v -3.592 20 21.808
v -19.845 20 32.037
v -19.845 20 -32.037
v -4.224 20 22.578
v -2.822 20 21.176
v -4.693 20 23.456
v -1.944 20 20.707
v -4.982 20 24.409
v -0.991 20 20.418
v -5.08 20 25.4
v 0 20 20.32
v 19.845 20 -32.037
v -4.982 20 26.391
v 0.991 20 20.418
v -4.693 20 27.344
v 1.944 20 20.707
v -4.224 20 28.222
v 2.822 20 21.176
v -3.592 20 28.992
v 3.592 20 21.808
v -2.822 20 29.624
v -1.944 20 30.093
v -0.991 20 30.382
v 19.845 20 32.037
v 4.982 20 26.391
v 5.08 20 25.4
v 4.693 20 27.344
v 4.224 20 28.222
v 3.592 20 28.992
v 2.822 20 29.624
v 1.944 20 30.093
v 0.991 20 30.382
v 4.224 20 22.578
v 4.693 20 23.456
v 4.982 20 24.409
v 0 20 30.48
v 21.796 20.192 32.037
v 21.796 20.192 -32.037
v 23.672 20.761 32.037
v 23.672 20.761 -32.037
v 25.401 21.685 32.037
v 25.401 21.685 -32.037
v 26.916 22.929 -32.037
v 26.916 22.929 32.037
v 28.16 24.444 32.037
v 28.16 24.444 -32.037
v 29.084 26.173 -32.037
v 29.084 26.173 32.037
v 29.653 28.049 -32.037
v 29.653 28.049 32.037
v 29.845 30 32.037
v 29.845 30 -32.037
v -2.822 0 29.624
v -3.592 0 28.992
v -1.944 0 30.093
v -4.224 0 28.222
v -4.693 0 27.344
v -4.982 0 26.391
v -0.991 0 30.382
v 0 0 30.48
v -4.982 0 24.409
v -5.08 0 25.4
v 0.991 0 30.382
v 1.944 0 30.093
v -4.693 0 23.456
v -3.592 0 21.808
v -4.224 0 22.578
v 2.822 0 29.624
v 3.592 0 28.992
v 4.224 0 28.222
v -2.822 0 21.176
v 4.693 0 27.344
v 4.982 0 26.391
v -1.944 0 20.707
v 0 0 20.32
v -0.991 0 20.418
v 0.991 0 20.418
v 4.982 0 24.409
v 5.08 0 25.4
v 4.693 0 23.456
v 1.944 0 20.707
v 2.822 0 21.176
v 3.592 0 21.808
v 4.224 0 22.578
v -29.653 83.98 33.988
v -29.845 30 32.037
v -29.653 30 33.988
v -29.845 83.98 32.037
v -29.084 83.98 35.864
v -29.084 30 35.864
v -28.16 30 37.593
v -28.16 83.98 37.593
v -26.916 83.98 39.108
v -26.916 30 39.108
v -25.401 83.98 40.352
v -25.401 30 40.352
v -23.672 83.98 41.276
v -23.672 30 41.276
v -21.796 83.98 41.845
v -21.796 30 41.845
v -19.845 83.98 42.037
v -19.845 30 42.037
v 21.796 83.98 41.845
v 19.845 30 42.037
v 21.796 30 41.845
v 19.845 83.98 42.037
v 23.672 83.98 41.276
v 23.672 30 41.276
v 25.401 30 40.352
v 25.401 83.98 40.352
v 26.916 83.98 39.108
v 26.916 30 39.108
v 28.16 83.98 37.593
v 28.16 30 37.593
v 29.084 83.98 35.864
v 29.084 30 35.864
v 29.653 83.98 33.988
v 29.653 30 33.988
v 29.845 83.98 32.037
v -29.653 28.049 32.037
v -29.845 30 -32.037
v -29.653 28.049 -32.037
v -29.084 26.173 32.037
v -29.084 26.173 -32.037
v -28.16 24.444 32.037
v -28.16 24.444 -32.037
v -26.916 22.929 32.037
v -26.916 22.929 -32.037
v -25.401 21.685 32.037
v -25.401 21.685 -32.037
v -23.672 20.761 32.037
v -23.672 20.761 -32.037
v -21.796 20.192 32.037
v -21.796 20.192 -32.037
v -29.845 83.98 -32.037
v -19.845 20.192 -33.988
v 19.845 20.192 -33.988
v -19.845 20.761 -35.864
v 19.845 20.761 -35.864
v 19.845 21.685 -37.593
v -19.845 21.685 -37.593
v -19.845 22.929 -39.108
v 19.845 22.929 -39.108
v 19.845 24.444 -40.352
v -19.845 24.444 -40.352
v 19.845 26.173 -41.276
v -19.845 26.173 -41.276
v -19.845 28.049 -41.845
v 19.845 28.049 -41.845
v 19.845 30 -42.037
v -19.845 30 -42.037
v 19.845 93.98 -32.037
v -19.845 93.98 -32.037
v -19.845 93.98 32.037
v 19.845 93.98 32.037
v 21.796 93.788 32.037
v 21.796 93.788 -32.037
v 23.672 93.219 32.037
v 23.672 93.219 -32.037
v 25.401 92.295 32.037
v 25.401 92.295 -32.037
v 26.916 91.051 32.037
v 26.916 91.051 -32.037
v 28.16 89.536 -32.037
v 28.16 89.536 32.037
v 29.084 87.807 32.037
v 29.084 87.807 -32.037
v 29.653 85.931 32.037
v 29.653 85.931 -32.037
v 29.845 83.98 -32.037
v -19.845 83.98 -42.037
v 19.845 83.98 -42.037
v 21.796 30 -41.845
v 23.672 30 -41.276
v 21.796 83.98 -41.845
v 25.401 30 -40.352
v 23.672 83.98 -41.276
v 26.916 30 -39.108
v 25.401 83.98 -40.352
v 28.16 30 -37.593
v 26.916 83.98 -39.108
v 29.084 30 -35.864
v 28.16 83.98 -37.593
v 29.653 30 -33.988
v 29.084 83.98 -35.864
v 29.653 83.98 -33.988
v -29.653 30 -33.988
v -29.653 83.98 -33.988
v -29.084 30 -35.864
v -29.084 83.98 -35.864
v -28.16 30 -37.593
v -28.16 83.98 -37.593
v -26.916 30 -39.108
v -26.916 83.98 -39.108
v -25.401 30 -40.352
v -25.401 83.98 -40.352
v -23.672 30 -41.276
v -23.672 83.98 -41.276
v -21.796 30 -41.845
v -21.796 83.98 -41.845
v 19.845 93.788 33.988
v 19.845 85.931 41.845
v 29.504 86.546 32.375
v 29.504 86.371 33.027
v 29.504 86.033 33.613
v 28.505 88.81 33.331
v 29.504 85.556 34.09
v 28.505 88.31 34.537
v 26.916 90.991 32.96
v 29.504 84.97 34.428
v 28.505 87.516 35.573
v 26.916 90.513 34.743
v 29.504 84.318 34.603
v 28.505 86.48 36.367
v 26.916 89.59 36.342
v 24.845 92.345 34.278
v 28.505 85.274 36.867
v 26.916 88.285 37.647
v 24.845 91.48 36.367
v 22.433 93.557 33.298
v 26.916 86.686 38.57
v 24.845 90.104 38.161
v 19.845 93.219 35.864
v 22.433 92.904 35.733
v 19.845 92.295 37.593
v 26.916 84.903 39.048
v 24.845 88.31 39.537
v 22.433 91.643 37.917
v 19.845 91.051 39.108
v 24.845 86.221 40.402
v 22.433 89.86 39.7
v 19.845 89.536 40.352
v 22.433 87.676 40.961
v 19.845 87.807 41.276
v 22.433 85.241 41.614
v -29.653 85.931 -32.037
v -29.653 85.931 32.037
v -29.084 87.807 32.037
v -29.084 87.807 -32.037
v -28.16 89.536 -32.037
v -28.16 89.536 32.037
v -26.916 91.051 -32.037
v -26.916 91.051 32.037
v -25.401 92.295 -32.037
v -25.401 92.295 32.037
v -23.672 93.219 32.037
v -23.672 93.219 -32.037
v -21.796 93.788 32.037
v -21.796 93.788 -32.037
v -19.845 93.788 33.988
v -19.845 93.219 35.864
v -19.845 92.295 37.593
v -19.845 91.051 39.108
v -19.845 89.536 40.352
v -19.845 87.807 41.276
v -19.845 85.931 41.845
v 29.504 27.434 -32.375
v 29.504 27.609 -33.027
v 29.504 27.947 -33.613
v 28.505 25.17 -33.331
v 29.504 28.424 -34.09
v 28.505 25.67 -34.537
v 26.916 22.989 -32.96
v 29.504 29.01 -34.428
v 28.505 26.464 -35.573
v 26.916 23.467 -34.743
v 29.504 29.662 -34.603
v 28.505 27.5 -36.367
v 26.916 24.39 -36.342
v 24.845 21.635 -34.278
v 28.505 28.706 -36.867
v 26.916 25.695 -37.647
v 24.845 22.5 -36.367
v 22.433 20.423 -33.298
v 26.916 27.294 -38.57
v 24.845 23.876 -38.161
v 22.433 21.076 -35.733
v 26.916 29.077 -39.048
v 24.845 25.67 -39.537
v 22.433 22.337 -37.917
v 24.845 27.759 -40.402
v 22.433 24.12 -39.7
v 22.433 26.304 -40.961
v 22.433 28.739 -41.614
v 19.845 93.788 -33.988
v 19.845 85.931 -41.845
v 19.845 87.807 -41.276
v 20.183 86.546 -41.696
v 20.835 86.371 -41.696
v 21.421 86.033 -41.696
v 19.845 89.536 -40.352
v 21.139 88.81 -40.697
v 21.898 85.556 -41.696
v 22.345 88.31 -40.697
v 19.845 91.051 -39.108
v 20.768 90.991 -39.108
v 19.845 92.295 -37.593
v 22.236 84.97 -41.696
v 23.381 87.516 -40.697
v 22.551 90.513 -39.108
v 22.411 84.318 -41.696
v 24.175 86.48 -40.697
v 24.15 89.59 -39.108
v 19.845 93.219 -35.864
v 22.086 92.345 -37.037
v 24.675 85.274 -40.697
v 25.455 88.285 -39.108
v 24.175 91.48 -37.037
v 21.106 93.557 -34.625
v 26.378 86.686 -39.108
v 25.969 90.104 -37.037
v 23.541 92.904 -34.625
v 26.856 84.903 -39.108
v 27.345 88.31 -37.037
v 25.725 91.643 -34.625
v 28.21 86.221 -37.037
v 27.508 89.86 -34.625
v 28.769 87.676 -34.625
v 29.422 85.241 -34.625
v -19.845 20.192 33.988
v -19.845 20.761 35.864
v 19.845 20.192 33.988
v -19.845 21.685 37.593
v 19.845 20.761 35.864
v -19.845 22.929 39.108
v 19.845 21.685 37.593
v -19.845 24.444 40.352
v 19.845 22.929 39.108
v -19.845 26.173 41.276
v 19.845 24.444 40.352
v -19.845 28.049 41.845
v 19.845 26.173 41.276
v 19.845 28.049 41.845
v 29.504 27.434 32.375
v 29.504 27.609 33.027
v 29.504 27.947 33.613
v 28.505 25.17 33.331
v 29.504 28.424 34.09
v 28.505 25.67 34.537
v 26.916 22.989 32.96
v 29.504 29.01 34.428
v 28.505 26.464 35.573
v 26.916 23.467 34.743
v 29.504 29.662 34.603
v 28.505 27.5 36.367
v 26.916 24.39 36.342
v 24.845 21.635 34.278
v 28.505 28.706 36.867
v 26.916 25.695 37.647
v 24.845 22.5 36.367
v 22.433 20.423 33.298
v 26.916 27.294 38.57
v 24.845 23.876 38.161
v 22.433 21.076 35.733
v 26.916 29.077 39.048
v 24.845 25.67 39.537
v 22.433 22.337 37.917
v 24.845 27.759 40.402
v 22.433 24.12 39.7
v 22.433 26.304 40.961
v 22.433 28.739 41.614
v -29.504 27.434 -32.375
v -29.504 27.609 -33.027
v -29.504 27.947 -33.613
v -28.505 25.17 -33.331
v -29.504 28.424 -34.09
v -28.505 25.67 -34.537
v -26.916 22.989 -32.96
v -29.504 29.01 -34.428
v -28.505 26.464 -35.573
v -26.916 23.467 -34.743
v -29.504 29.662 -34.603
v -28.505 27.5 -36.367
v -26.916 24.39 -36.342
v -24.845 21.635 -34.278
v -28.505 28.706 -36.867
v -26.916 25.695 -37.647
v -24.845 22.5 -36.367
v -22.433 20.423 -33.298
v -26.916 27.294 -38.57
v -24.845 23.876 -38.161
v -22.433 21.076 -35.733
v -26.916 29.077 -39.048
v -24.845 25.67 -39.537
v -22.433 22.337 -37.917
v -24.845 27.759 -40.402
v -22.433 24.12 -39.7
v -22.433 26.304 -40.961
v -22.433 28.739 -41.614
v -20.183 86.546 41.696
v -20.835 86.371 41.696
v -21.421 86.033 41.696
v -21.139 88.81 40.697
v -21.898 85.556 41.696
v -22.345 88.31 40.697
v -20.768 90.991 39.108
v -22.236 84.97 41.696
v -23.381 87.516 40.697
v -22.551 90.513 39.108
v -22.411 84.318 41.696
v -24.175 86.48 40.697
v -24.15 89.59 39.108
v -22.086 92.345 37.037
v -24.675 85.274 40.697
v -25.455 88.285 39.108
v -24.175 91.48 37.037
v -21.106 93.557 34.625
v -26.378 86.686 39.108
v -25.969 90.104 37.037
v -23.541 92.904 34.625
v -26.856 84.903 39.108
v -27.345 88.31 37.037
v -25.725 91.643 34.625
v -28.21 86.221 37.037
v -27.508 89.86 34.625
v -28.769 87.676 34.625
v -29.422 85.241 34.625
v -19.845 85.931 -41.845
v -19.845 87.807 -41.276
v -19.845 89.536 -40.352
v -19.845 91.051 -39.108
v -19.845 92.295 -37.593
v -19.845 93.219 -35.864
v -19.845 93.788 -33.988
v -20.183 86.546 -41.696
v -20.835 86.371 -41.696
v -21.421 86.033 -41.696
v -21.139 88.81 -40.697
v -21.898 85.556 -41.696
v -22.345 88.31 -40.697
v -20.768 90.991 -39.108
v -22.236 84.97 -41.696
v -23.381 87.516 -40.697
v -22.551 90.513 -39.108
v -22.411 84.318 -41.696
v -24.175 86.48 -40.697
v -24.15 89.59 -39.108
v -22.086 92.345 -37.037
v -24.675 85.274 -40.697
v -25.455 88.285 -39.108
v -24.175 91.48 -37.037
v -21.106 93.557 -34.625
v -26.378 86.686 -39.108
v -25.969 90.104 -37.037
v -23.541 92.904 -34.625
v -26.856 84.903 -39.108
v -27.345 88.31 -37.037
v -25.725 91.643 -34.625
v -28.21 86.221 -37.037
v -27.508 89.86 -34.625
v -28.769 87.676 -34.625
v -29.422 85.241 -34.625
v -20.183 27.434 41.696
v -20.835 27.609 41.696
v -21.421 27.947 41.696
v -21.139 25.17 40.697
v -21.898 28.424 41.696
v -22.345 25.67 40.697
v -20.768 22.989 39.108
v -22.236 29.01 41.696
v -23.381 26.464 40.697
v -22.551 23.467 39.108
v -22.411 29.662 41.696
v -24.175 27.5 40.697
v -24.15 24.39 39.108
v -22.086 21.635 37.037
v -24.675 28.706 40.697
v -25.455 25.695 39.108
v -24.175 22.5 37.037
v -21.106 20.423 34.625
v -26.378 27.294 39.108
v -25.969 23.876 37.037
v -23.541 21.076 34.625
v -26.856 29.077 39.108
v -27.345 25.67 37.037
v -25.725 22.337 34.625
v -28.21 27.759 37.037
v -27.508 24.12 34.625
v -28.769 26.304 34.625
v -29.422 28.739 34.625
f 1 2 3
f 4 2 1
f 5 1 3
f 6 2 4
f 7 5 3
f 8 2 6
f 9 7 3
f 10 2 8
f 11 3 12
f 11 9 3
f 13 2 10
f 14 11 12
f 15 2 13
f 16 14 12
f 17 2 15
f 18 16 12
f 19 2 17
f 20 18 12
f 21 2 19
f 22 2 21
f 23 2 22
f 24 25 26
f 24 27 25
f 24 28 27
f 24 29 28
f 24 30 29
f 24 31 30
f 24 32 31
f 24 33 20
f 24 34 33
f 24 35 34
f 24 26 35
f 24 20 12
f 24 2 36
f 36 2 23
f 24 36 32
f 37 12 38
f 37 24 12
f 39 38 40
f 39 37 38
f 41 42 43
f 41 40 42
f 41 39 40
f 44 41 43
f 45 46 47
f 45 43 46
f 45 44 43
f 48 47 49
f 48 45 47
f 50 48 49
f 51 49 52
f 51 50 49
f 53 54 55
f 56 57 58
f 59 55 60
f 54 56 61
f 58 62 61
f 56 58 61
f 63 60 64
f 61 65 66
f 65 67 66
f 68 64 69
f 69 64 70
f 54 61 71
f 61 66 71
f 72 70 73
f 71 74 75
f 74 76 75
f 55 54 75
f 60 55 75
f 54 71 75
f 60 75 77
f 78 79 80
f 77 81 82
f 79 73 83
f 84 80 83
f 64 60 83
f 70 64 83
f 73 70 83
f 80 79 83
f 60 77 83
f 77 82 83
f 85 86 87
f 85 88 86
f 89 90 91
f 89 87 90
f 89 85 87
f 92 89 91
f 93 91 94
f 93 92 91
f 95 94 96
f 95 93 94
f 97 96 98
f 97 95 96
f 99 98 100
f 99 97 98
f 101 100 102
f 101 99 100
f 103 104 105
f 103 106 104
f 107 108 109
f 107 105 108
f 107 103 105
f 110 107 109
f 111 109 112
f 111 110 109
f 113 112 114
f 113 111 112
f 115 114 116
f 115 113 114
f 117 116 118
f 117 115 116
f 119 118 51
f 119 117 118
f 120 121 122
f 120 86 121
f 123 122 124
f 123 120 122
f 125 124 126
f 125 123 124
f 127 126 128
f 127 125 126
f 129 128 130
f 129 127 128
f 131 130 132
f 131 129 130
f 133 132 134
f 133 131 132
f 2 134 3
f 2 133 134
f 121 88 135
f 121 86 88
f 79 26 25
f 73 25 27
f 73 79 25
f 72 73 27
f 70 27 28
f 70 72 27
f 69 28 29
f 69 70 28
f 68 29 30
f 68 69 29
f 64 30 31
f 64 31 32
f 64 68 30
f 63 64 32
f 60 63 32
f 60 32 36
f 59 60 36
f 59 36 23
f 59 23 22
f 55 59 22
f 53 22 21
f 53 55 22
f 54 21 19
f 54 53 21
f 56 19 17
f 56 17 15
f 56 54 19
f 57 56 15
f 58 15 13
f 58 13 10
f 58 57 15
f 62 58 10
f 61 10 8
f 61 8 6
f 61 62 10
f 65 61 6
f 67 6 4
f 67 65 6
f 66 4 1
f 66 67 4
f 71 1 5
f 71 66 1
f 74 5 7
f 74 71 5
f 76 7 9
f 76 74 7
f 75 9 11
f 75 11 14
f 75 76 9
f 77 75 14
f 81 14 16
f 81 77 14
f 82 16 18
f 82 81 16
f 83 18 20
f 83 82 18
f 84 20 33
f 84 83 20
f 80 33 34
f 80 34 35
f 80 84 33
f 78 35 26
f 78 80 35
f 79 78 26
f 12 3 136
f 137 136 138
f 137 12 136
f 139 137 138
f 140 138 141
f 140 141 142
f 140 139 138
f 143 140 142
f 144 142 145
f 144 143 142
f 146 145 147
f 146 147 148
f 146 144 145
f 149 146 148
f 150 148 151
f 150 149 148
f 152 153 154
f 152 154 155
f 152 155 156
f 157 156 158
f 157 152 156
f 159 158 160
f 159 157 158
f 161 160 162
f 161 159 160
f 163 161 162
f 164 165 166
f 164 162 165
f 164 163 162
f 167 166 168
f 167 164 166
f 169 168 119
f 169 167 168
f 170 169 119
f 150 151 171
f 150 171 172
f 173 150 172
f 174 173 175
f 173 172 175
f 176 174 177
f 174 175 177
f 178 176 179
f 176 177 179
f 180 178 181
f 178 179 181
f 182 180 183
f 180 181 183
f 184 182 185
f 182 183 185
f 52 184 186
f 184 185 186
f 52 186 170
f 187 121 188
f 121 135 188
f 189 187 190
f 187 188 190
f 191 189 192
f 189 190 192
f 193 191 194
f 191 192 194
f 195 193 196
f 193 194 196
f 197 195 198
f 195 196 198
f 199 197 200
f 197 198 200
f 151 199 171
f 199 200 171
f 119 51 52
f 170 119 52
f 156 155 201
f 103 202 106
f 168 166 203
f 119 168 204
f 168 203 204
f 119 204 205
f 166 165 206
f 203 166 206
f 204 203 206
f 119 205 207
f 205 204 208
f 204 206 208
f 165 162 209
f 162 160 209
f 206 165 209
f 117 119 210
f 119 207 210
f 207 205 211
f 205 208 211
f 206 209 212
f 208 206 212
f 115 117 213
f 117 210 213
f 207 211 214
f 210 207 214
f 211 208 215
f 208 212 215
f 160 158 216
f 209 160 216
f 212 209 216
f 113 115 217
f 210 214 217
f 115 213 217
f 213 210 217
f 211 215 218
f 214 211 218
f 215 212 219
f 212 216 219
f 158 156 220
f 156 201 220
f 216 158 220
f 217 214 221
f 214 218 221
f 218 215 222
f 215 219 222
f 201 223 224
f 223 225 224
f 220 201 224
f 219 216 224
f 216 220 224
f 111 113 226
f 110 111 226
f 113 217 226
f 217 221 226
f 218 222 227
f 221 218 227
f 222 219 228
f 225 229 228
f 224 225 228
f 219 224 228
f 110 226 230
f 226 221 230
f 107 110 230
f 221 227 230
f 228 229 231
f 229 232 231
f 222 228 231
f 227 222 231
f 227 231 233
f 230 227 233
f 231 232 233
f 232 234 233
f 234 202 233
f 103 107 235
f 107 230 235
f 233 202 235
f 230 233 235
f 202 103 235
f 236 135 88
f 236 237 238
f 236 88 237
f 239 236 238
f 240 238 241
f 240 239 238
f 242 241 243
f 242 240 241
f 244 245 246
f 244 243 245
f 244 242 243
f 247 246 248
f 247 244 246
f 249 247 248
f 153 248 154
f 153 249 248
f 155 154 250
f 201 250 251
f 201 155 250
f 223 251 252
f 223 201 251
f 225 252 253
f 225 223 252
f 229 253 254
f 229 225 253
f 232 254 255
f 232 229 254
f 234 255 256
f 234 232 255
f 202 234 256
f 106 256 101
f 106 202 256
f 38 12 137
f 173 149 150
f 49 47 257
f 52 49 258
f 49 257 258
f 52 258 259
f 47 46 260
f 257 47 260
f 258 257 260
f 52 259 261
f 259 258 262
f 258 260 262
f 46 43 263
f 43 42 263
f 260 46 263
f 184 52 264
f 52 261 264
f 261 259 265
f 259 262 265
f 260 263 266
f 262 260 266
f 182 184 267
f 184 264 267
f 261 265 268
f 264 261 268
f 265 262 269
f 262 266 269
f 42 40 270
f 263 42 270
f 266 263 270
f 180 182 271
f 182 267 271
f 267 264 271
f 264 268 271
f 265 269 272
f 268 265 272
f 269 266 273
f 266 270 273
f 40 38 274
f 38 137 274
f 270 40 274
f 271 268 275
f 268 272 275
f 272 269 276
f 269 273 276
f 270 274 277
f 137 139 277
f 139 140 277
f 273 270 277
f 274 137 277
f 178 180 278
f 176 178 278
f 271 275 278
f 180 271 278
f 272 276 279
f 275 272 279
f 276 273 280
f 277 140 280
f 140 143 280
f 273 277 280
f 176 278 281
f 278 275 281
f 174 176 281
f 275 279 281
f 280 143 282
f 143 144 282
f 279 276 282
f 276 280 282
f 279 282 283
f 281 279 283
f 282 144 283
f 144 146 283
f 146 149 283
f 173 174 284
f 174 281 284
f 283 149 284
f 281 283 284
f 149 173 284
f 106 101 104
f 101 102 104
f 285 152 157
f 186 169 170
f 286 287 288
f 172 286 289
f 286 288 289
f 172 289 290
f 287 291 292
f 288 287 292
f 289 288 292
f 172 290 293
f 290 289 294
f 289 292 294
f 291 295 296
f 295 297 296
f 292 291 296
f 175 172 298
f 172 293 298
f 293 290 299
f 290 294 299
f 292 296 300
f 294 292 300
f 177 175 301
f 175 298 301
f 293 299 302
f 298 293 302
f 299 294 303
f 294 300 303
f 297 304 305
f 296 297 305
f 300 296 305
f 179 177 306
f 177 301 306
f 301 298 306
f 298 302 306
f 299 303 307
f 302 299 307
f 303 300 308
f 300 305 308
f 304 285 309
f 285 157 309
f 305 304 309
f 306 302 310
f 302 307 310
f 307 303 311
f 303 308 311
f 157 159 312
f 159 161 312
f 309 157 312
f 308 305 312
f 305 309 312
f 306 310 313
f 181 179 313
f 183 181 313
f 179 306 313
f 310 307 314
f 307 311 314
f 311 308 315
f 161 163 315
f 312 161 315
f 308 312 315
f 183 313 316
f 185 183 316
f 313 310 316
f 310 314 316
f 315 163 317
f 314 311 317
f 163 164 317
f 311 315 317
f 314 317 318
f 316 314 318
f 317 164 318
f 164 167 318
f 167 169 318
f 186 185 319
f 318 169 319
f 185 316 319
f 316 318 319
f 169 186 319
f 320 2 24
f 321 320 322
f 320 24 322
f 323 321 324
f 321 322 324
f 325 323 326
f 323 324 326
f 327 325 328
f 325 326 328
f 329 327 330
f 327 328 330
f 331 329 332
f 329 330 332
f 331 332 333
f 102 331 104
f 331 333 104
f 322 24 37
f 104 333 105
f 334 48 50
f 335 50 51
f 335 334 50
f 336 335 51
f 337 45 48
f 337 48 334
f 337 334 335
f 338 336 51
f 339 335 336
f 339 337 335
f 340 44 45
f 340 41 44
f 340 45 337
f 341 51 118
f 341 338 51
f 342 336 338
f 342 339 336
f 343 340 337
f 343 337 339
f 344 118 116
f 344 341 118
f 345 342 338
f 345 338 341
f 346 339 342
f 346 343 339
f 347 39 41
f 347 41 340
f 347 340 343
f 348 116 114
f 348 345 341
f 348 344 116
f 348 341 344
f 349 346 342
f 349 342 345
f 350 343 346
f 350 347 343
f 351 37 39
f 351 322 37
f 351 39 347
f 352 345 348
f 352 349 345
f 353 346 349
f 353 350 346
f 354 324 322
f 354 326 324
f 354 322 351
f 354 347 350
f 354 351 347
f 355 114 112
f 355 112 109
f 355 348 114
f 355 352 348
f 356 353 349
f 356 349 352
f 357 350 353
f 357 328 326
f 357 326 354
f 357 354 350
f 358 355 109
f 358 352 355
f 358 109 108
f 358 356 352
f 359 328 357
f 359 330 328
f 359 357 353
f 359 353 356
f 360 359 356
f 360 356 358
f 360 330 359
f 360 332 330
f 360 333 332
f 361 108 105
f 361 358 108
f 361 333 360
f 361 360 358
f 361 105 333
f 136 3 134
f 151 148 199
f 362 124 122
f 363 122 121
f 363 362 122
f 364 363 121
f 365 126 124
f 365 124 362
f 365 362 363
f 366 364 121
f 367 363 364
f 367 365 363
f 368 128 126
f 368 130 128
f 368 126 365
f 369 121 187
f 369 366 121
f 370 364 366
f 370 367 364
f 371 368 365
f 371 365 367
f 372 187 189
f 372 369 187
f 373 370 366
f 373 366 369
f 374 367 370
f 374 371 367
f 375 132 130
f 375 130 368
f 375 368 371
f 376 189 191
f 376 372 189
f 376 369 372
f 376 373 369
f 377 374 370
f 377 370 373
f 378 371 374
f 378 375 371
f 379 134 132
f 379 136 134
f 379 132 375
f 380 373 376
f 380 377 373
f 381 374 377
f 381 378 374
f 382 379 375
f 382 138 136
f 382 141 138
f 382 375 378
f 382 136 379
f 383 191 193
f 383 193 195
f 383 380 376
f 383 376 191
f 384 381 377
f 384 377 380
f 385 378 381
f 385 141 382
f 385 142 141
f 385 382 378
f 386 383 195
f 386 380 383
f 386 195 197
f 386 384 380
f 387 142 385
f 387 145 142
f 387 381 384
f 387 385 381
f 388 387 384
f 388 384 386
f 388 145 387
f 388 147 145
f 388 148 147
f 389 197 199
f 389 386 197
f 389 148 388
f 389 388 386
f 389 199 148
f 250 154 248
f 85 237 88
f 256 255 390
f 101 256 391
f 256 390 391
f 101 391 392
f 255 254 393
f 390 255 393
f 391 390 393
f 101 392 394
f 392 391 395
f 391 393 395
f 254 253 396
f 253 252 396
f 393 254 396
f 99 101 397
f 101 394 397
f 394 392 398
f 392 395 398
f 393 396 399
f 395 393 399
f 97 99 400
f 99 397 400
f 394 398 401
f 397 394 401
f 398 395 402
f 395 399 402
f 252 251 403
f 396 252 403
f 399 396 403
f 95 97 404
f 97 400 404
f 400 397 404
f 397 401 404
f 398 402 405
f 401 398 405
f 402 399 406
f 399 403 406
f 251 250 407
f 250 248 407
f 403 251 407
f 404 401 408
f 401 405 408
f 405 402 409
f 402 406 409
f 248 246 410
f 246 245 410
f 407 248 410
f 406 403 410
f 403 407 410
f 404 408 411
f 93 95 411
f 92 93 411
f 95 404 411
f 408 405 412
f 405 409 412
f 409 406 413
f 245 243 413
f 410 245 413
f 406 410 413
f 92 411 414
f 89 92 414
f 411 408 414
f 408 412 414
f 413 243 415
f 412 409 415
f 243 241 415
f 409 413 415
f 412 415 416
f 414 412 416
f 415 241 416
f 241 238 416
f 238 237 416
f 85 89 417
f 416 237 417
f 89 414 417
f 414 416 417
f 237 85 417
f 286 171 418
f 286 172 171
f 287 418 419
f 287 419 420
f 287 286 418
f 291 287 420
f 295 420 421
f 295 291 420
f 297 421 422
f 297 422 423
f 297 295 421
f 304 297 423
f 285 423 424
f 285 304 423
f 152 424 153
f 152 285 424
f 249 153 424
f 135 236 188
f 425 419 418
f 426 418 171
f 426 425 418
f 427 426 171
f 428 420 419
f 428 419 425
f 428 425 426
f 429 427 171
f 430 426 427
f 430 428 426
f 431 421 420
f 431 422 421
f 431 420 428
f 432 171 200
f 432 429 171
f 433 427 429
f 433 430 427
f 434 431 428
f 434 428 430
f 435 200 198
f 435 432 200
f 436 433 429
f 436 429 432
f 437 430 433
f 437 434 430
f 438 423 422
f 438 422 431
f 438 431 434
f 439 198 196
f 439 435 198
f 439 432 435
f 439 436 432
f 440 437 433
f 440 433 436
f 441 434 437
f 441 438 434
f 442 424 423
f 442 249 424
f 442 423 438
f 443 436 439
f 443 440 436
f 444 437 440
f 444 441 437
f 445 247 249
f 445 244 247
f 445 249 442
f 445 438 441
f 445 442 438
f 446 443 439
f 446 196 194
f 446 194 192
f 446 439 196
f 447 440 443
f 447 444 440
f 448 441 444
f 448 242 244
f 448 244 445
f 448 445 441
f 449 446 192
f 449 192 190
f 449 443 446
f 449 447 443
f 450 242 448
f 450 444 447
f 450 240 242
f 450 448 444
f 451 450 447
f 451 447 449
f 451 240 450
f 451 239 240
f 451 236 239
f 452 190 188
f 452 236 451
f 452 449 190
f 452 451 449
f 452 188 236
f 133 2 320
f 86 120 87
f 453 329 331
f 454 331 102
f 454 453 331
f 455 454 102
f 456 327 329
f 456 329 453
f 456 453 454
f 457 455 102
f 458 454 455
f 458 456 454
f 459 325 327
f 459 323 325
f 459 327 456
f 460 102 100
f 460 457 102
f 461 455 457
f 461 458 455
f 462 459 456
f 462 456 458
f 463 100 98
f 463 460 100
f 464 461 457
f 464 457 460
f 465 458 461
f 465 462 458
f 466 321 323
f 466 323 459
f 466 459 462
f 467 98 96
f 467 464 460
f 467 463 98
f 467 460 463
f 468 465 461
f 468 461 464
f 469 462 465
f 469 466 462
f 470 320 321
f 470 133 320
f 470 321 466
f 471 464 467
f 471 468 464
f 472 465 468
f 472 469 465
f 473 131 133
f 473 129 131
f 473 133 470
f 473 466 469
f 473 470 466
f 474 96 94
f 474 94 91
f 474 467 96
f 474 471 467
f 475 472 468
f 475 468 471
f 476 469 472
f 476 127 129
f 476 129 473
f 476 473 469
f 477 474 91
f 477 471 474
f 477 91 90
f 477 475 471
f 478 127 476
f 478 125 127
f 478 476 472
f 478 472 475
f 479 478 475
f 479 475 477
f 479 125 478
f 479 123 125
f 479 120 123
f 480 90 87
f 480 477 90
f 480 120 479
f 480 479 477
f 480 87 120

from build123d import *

# Parameters (mm, degrees)
SKETCH3_W           = 59.69
SKETCH3_H           = 84.074
BOSS_EXTRUDE1_DEPTH = 93.98
SKETCH4_W           = 59.69
SKETCH4_H           = 84.074
SKETCH4_R           = 5.08
CUT_EXTRUDE1_DEPTH  = 20
FILLET1_R           = 10


with BuildPart() as part:
    # Sketch3 → Boss-Extrude1 (new body)
    with BuildSketch(Plane(origin=(0, 0, 0), x_dir=(1, 0, 0), z_dir=(0, 1, 0))):
        Rectangle(SKETCH3_W, SKETCH3_H)
    extrude(amount=BOSS_EXTRUDE1_DEPTH)

    # Sketch4 → Cut-Extrude1 (cut)
    with BuildSketch(Plane.XZ):
        Rectangle(SKETCH4_W, SKETCH4_H)
        with Locations((0, 25.4)):
            Circle(SKETCH4_R, mode=Mode.SUBTRACT)
    extrude(amount=-CUT_EXTRUDE1_DEPTH, mode=Mode.SUBTRACT)

    # Fillet1
    fillet1_edges = [part.edges().sort_by_distance(p)[0] for p in [
        (-29.845, 93.98, 0),
        (0, 93.98, 42.037),
        (0, 20, -42.037),
        (-29.845, 20, 0),
        (0, 20, 42.037),
        (29.845, 20, 0),
        (29.845, 93.98, 0),
        (0, 93.98, -42.037),
        (29.845, 56.99, 42.037),
        (-29.845, 56.99, 42.037),
        (-29.845, 56.99, -42.037),
        (29.845, 56.99, -42.037),
    ]]
    fillet(fillet1_edges, radius=FILLET1_R)


solid = part.part
